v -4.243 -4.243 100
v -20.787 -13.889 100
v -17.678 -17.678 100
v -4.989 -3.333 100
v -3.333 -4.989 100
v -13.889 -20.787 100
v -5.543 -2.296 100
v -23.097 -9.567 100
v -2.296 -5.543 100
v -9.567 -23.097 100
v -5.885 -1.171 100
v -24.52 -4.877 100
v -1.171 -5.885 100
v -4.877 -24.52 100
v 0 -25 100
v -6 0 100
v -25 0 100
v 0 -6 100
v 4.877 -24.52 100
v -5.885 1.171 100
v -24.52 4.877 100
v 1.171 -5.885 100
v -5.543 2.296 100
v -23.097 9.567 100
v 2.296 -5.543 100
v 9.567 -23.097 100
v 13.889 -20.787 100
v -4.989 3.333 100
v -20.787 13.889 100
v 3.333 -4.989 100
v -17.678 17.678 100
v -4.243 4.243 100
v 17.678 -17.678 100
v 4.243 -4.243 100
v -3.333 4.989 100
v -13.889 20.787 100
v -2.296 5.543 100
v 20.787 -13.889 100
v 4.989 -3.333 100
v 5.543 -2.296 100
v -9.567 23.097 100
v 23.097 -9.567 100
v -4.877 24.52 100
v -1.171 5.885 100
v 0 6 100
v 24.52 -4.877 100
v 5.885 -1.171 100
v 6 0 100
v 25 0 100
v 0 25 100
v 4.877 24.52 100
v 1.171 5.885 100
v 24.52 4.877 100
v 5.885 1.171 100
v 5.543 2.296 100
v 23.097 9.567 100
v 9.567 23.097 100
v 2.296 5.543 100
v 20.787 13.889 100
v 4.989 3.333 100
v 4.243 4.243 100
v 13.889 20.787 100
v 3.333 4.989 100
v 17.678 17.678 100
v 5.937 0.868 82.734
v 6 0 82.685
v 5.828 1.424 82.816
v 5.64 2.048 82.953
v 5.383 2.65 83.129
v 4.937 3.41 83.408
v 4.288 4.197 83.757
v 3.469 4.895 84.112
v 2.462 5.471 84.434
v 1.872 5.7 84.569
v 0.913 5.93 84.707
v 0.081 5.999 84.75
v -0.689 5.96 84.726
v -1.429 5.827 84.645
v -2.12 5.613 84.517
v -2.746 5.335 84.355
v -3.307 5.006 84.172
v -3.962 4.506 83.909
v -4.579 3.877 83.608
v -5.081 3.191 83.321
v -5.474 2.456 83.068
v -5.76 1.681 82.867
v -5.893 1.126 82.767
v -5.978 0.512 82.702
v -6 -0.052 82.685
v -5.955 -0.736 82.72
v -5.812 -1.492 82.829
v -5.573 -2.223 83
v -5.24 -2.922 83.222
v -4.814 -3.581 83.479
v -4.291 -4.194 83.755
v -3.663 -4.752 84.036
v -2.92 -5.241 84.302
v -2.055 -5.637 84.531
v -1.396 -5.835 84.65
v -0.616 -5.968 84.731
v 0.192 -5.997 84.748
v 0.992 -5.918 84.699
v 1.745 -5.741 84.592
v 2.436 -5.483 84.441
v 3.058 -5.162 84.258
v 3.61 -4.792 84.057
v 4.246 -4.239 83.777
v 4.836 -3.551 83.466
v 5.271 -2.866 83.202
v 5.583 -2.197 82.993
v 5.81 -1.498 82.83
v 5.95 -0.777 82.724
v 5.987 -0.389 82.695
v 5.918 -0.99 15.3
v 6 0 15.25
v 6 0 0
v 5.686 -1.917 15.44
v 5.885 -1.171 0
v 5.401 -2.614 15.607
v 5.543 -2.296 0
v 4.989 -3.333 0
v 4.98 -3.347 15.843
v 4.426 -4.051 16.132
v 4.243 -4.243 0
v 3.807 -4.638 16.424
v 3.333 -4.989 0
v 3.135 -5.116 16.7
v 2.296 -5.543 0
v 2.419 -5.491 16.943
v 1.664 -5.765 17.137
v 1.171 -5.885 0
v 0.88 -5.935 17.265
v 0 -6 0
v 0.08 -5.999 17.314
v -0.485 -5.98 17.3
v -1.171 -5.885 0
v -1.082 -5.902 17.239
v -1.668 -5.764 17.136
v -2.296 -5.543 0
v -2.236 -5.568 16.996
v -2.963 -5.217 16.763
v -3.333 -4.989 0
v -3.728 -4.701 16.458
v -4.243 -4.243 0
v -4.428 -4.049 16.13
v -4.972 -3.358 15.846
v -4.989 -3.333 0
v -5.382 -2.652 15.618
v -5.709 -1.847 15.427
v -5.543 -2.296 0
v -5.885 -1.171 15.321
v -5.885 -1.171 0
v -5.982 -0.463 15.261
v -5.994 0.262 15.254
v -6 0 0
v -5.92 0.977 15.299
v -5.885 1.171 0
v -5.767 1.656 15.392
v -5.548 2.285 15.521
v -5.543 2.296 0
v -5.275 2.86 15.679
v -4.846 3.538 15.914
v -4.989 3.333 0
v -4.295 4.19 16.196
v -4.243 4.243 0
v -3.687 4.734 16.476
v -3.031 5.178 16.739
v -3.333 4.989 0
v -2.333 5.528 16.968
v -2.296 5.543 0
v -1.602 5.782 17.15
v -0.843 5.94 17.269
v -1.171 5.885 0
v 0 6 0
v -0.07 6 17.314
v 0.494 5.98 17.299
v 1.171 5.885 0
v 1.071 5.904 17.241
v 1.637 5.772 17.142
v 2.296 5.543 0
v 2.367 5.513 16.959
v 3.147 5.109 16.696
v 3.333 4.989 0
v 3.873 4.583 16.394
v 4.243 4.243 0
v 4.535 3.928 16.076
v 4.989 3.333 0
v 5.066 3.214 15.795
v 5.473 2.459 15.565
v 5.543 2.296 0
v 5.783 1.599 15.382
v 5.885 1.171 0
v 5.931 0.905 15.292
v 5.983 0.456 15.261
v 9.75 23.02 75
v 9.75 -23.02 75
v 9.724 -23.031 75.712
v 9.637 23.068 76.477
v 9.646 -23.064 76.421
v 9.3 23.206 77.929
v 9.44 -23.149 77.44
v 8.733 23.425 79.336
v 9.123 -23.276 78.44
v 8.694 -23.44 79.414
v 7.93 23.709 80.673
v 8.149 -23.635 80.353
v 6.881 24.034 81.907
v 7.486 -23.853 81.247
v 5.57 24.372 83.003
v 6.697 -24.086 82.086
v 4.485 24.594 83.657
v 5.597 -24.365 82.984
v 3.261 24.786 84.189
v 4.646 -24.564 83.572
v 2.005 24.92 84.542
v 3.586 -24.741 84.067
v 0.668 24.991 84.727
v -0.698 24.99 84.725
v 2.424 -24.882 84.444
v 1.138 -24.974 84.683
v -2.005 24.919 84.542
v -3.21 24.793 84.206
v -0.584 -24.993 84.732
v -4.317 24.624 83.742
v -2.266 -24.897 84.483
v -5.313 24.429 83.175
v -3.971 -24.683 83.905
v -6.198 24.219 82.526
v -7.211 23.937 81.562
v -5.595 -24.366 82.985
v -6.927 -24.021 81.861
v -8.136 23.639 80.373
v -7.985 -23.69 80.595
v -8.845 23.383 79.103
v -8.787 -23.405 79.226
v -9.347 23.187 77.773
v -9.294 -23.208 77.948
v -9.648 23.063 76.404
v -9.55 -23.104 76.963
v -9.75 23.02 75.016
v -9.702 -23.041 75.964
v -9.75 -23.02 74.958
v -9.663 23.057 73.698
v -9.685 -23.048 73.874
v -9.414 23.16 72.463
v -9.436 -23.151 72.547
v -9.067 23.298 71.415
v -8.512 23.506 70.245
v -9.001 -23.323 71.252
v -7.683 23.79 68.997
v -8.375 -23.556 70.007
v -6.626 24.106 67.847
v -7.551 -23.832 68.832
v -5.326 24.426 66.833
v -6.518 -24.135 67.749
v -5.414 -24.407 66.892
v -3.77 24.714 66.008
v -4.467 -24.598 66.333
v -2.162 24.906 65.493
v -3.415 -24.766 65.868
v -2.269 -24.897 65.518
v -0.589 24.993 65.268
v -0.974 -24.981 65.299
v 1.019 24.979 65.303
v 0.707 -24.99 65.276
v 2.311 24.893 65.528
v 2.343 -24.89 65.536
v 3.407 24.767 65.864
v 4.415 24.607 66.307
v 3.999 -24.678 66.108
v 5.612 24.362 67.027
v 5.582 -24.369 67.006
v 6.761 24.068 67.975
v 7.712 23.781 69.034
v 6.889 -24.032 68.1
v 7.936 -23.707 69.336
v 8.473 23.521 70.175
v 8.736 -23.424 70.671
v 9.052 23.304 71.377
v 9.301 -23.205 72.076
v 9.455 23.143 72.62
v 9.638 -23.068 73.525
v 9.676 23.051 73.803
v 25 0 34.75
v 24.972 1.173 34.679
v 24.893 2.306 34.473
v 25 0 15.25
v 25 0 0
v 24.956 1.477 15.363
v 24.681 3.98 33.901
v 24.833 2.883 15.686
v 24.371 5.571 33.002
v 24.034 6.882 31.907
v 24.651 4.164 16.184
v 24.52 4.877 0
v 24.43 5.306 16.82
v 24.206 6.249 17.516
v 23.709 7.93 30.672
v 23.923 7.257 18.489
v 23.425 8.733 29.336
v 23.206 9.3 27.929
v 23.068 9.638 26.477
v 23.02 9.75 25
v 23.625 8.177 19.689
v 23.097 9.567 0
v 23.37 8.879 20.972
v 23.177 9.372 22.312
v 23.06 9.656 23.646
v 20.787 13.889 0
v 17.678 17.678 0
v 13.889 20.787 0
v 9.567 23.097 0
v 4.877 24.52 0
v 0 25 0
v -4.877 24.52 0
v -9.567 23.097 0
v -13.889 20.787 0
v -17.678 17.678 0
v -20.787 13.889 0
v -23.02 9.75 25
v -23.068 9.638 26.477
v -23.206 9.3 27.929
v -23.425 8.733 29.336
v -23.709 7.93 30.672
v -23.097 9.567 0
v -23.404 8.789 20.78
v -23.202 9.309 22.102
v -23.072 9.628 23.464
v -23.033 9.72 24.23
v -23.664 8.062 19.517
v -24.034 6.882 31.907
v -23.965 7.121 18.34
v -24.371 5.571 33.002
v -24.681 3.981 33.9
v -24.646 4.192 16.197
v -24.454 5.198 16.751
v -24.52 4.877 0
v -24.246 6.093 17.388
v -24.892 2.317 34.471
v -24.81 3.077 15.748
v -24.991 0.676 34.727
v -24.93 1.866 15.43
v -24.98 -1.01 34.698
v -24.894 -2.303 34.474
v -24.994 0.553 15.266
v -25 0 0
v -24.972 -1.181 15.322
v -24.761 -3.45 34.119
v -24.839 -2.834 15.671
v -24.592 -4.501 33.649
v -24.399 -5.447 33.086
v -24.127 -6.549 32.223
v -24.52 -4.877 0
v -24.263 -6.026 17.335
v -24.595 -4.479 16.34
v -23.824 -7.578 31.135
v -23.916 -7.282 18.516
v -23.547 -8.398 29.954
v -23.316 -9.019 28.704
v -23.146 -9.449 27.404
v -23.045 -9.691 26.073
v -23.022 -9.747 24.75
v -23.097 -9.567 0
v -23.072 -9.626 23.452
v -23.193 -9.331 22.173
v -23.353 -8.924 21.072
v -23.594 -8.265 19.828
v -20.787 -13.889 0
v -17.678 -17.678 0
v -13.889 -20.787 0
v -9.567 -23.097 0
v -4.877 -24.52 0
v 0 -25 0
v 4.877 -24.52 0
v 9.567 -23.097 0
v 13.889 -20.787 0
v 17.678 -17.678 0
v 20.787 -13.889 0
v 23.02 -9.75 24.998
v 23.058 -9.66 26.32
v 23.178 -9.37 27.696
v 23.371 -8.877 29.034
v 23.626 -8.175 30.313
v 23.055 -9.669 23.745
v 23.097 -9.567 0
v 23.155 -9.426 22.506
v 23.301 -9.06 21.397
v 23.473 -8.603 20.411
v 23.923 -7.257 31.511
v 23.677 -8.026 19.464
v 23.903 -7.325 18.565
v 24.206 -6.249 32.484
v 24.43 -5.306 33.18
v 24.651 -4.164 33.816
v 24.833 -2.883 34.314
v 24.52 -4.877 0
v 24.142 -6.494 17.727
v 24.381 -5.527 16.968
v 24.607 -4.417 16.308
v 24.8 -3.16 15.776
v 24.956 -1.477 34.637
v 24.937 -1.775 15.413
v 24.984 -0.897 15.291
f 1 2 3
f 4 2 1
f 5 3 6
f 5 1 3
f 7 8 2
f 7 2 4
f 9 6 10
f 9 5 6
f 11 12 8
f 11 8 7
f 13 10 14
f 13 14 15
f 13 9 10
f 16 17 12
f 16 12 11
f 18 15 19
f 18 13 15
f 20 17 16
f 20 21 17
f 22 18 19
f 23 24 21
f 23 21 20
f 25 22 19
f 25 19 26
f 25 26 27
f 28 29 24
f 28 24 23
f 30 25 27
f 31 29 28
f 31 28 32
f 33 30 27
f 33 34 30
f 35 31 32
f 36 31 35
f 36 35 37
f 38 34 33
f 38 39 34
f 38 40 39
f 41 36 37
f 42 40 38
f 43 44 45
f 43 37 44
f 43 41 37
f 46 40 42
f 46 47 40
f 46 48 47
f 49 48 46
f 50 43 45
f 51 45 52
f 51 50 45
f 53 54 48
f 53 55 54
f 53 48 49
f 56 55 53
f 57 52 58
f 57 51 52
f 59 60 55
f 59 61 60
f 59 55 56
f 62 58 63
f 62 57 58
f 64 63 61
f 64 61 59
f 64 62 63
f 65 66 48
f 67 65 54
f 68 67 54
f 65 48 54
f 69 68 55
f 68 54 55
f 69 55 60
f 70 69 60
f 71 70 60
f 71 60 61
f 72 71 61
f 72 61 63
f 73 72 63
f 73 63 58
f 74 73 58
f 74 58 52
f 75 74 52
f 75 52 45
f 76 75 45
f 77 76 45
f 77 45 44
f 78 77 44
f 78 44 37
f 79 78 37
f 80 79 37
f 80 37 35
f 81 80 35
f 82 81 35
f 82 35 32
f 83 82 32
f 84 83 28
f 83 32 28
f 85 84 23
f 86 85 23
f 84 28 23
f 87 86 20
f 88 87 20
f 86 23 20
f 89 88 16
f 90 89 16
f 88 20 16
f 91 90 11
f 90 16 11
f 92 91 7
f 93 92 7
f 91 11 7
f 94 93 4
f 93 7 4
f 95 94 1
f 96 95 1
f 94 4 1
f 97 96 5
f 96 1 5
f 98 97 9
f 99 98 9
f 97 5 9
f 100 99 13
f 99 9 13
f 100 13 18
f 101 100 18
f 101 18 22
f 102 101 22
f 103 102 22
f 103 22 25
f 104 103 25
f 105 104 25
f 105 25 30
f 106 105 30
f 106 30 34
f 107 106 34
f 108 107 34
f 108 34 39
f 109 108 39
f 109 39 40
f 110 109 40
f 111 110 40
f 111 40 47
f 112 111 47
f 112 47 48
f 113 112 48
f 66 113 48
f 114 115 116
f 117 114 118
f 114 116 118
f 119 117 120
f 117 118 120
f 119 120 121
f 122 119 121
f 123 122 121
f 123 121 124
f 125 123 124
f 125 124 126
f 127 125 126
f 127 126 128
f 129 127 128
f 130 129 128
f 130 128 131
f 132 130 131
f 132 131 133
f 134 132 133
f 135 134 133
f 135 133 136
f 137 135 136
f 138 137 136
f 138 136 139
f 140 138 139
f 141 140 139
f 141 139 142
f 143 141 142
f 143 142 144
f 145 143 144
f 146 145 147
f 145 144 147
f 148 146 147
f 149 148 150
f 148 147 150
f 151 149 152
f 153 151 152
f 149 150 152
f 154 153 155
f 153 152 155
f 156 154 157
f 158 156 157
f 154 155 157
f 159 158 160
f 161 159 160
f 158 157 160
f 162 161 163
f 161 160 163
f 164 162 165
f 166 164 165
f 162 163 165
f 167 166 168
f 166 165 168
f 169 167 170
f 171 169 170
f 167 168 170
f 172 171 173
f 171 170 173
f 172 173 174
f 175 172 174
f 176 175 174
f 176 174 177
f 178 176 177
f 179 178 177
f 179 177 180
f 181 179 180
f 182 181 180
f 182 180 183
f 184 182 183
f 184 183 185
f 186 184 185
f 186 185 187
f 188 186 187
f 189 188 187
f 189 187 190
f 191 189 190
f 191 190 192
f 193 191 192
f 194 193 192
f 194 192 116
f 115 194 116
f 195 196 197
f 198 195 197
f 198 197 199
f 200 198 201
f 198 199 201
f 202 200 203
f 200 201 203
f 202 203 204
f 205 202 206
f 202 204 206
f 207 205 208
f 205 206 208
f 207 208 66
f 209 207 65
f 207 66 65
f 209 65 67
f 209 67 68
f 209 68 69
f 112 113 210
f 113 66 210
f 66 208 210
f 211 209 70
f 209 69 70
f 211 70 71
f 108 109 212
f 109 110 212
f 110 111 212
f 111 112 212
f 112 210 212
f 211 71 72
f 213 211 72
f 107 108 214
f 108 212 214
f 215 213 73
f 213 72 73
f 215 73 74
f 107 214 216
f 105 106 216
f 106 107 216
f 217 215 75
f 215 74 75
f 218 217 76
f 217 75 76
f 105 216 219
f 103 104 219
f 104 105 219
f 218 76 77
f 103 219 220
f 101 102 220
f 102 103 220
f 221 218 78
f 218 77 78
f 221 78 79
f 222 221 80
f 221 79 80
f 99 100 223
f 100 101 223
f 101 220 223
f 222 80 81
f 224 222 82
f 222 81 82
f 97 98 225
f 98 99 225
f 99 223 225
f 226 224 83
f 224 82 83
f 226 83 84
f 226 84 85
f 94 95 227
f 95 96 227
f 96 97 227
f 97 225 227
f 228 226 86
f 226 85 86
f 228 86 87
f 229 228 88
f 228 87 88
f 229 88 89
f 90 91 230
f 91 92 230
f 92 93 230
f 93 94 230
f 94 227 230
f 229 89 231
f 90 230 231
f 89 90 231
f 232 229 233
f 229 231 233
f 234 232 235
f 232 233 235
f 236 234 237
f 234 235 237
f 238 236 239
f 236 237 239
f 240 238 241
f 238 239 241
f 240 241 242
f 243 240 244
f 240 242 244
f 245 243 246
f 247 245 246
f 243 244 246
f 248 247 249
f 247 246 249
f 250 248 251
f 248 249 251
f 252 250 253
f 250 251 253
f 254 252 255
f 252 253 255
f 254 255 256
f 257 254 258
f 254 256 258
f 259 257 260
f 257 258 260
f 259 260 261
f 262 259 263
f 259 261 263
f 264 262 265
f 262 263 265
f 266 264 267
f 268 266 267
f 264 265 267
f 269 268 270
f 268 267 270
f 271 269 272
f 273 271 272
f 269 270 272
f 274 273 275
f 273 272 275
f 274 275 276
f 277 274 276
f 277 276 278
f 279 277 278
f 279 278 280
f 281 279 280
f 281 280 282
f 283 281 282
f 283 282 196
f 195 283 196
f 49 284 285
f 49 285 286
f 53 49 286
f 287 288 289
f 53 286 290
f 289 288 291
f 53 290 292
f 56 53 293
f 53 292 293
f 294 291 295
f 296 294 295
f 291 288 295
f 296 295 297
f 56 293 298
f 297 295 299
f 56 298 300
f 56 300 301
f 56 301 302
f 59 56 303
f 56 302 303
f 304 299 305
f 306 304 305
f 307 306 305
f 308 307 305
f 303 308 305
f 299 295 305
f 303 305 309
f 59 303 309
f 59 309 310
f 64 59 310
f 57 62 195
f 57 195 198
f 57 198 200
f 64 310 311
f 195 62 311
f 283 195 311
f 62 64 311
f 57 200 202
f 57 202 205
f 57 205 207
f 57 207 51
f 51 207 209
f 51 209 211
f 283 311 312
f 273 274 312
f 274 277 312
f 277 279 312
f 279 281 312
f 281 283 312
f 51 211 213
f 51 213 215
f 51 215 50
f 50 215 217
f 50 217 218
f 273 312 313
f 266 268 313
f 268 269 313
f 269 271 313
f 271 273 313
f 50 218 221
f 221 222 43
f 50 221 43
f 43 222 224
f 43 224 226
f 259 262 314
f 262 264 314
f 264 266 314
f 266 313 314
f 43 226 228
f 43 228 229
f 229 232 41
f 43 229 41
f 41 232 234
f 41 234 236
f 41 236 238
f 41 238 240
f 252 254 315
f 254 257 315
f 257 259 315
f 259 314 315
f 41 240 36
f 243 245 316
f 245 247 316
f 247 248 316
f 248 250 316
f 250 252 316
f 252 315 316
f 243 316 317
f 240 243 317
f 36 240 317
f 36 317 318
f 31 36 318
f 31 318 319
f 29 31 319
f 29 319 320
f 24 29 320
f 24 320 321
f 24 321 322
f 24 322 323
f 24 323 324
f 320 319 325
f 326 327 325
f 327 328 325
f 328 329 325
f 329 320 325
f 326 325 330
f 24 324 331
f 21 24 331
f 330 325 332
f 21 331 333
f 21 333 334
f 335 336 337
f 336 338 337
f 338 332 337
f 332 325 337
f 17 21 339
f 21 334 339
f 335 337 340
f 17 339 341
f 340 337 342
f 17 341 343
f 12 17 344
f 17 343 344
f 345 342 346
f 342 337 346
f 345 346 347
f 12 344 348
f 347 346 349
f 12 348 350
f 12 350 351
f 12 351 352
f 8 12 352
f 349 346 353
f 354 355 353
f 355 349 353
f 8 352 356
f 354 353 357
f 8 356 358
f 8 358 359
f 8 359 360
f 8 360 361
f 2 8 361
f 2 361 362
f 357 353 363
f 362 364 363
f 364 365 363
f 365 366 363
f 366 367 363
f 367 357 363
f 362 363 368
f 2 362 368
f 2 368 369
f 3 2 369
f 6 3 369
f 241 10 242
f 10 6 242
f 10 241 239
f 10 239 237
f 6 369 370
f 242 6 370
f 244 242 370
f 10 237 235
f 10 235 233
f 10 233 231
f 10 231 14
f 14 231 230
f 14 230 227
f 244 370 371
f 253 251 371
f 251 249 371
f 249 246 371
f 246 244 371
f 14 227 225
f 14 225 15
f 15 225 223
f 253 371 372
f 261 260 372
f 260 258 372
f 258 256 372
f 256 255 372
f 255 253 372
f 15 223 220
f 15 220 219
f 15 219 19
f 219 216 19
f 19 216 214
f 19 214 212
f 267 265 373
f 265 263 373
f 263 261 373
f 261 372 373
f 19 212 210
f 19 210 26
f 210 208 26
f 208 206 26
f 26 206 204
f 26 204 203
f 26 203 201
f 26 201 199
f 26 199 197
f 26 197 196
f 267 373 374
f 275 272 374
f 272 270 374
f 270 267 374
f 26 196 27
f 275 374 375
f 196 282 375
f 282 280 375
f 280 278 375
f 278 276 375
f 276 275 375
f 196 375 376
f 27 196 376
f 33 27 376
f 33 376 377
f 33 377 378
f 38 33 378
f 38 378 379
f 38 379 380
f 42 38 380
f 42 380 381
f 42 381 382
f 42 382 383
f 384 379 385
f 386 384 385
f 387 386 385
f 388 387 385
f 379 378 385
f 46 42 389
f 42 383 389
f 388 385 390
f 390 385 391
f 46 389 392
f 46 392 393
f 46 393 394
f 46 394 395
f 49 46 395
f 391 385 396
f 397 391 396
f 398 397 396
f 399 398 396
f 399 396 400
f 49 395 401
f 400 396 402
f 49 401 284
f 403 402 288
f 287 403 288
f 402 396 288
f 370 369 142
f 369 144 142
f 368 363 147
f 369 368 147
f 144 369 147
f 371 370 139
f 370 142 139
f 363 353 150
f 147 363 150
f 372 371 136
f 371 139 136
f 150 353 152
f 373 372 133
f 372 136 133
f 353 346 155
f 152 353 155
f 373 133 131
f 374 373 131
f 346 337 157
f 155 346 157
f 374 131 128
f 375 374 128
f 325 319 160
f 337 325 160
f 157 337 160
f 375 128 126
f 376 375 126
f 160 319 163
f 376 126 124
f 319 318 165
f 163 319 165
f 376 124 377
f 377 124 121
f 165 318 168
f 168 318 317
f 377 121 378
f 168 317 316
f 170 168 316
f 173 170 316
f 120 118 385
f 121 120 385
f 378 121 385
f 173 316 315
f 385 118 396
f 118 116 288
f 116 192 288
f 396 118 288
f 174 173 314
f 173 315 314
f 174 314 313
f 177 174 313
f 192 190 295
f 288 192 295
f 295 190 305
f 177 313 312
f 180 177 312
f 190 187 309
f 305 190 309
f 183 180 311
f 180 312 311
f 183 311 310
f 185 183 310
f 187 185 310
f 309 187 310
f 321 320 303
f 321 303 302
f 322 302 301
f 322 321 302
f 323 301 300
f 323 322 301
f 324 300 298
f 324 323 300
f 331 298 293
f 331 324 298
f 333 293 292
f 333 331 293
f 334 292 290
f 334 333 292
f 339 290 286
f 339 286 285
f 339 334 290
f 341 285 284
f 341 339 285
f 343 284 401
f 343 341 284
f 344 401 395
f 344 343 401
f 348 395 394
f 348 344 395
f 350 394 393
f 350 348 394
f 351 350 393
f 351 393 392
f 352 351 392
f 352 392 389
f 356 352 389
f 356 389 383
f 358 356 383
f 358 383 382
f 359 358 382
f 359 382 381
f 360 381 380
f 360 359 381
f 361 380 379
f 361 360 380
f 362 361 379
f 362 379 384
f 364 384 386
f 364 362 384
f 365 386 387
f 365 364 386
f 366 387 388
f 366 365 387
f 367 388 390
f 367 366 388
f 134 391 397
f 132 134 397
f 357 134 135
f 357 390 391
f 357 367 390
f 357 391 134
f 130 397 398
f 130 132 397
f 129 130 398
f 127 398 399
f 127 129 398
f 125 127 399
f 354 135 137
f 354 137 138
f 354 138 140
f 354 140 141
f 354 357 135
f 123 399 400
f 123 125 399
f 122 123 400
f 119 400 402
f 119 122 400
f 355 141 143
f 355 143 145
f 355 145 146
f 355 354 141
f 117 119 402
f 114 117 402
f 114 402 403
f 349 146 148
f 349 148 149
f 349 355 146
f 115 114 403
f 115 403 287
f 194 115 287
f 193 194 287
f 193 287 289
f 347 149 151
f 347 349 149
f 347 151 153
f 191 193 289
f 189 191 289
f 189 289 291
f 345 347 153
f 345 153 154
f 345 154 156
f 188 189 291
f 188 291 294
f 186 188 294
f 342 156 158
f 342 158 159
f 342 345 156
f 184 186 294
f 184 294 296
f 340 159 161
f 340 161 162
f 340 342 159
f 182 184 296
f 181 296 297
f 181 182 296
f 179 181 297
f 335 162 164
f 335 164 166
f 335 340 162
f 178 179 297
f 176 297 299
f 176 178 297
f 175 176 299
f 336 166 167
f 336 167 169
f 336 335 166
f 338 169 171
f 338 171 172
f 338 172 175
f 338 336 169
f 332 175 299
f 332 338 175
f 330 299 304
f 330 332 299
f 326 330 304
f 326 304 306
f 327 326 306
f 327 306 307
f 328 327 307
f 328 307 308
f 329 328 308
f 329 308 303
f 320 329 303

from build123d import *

# Parameters (mm, degrees)
F0_R          = 25
F1_DEPTH      = 100
F2_R          = 9.75
F3_DEPTH      = 25.001
F3_DEPTH_BACK = 25
F4_R          = 9.75
F5_DEPTH      = 25.0010001
F5_DEPTH_BACK = 25
F6_R          = 6
F7_DEPTH      = 25
F8_R          = 6
F9_DEPTH      = 25


with BuildPart() as f1:
    # F0 (on Top) → F1 (new body)
    with BuildSketch(Plane.XY):
        Circle(F0_R)
    extrude(amount=F1_DEPTH)

    # F2 (on Right) → F3 (cut, two sides)
    with BuildSketch(Plane.YZ) as f3_sk:
        with Locations((0, 25)):
            Circle(F2_R)
    extrude(amount=F3_DEPTH, mode=Mode.SUBTRACT)
    extrude(f3_sk.sketch, amount=-F3_DEPTH_BACK, mode=Mode.SUBTRACT)

    # F4 (on Front) → F5 (cut, two sides)
    with BuildSketch(Plane.XZ) as f5_sk:
        with Locations((0, 75)):
            Circle(F4_R)
    extrude(amount=-F5_DEPTH, mode=Mode.SUBTRACT)
    extrude(f5_sk.sketch, amount=F5_DEPTH_BACK, mode=Mode.SUBTRACT)

    # F6 (on face) → F7 (cut)
    with BuildSketch(Plane.XY.offset(100)):
        Circle(F6_R)
    extrude(amount=-F7_DEPTH, mode=Mode.SUBTRACT)

    # F8 (on face) → F9 (cut)
    with BuildSketch(Plane(origin=(0, 0, 0), x_dir=(1, 0, 0), z_dir=(0, 0, -1))):
        Circle(F8_R)
    extrude(amount=-F9_DEPTH, mode=Mode.SUBTRACT)


solid = f1.part
